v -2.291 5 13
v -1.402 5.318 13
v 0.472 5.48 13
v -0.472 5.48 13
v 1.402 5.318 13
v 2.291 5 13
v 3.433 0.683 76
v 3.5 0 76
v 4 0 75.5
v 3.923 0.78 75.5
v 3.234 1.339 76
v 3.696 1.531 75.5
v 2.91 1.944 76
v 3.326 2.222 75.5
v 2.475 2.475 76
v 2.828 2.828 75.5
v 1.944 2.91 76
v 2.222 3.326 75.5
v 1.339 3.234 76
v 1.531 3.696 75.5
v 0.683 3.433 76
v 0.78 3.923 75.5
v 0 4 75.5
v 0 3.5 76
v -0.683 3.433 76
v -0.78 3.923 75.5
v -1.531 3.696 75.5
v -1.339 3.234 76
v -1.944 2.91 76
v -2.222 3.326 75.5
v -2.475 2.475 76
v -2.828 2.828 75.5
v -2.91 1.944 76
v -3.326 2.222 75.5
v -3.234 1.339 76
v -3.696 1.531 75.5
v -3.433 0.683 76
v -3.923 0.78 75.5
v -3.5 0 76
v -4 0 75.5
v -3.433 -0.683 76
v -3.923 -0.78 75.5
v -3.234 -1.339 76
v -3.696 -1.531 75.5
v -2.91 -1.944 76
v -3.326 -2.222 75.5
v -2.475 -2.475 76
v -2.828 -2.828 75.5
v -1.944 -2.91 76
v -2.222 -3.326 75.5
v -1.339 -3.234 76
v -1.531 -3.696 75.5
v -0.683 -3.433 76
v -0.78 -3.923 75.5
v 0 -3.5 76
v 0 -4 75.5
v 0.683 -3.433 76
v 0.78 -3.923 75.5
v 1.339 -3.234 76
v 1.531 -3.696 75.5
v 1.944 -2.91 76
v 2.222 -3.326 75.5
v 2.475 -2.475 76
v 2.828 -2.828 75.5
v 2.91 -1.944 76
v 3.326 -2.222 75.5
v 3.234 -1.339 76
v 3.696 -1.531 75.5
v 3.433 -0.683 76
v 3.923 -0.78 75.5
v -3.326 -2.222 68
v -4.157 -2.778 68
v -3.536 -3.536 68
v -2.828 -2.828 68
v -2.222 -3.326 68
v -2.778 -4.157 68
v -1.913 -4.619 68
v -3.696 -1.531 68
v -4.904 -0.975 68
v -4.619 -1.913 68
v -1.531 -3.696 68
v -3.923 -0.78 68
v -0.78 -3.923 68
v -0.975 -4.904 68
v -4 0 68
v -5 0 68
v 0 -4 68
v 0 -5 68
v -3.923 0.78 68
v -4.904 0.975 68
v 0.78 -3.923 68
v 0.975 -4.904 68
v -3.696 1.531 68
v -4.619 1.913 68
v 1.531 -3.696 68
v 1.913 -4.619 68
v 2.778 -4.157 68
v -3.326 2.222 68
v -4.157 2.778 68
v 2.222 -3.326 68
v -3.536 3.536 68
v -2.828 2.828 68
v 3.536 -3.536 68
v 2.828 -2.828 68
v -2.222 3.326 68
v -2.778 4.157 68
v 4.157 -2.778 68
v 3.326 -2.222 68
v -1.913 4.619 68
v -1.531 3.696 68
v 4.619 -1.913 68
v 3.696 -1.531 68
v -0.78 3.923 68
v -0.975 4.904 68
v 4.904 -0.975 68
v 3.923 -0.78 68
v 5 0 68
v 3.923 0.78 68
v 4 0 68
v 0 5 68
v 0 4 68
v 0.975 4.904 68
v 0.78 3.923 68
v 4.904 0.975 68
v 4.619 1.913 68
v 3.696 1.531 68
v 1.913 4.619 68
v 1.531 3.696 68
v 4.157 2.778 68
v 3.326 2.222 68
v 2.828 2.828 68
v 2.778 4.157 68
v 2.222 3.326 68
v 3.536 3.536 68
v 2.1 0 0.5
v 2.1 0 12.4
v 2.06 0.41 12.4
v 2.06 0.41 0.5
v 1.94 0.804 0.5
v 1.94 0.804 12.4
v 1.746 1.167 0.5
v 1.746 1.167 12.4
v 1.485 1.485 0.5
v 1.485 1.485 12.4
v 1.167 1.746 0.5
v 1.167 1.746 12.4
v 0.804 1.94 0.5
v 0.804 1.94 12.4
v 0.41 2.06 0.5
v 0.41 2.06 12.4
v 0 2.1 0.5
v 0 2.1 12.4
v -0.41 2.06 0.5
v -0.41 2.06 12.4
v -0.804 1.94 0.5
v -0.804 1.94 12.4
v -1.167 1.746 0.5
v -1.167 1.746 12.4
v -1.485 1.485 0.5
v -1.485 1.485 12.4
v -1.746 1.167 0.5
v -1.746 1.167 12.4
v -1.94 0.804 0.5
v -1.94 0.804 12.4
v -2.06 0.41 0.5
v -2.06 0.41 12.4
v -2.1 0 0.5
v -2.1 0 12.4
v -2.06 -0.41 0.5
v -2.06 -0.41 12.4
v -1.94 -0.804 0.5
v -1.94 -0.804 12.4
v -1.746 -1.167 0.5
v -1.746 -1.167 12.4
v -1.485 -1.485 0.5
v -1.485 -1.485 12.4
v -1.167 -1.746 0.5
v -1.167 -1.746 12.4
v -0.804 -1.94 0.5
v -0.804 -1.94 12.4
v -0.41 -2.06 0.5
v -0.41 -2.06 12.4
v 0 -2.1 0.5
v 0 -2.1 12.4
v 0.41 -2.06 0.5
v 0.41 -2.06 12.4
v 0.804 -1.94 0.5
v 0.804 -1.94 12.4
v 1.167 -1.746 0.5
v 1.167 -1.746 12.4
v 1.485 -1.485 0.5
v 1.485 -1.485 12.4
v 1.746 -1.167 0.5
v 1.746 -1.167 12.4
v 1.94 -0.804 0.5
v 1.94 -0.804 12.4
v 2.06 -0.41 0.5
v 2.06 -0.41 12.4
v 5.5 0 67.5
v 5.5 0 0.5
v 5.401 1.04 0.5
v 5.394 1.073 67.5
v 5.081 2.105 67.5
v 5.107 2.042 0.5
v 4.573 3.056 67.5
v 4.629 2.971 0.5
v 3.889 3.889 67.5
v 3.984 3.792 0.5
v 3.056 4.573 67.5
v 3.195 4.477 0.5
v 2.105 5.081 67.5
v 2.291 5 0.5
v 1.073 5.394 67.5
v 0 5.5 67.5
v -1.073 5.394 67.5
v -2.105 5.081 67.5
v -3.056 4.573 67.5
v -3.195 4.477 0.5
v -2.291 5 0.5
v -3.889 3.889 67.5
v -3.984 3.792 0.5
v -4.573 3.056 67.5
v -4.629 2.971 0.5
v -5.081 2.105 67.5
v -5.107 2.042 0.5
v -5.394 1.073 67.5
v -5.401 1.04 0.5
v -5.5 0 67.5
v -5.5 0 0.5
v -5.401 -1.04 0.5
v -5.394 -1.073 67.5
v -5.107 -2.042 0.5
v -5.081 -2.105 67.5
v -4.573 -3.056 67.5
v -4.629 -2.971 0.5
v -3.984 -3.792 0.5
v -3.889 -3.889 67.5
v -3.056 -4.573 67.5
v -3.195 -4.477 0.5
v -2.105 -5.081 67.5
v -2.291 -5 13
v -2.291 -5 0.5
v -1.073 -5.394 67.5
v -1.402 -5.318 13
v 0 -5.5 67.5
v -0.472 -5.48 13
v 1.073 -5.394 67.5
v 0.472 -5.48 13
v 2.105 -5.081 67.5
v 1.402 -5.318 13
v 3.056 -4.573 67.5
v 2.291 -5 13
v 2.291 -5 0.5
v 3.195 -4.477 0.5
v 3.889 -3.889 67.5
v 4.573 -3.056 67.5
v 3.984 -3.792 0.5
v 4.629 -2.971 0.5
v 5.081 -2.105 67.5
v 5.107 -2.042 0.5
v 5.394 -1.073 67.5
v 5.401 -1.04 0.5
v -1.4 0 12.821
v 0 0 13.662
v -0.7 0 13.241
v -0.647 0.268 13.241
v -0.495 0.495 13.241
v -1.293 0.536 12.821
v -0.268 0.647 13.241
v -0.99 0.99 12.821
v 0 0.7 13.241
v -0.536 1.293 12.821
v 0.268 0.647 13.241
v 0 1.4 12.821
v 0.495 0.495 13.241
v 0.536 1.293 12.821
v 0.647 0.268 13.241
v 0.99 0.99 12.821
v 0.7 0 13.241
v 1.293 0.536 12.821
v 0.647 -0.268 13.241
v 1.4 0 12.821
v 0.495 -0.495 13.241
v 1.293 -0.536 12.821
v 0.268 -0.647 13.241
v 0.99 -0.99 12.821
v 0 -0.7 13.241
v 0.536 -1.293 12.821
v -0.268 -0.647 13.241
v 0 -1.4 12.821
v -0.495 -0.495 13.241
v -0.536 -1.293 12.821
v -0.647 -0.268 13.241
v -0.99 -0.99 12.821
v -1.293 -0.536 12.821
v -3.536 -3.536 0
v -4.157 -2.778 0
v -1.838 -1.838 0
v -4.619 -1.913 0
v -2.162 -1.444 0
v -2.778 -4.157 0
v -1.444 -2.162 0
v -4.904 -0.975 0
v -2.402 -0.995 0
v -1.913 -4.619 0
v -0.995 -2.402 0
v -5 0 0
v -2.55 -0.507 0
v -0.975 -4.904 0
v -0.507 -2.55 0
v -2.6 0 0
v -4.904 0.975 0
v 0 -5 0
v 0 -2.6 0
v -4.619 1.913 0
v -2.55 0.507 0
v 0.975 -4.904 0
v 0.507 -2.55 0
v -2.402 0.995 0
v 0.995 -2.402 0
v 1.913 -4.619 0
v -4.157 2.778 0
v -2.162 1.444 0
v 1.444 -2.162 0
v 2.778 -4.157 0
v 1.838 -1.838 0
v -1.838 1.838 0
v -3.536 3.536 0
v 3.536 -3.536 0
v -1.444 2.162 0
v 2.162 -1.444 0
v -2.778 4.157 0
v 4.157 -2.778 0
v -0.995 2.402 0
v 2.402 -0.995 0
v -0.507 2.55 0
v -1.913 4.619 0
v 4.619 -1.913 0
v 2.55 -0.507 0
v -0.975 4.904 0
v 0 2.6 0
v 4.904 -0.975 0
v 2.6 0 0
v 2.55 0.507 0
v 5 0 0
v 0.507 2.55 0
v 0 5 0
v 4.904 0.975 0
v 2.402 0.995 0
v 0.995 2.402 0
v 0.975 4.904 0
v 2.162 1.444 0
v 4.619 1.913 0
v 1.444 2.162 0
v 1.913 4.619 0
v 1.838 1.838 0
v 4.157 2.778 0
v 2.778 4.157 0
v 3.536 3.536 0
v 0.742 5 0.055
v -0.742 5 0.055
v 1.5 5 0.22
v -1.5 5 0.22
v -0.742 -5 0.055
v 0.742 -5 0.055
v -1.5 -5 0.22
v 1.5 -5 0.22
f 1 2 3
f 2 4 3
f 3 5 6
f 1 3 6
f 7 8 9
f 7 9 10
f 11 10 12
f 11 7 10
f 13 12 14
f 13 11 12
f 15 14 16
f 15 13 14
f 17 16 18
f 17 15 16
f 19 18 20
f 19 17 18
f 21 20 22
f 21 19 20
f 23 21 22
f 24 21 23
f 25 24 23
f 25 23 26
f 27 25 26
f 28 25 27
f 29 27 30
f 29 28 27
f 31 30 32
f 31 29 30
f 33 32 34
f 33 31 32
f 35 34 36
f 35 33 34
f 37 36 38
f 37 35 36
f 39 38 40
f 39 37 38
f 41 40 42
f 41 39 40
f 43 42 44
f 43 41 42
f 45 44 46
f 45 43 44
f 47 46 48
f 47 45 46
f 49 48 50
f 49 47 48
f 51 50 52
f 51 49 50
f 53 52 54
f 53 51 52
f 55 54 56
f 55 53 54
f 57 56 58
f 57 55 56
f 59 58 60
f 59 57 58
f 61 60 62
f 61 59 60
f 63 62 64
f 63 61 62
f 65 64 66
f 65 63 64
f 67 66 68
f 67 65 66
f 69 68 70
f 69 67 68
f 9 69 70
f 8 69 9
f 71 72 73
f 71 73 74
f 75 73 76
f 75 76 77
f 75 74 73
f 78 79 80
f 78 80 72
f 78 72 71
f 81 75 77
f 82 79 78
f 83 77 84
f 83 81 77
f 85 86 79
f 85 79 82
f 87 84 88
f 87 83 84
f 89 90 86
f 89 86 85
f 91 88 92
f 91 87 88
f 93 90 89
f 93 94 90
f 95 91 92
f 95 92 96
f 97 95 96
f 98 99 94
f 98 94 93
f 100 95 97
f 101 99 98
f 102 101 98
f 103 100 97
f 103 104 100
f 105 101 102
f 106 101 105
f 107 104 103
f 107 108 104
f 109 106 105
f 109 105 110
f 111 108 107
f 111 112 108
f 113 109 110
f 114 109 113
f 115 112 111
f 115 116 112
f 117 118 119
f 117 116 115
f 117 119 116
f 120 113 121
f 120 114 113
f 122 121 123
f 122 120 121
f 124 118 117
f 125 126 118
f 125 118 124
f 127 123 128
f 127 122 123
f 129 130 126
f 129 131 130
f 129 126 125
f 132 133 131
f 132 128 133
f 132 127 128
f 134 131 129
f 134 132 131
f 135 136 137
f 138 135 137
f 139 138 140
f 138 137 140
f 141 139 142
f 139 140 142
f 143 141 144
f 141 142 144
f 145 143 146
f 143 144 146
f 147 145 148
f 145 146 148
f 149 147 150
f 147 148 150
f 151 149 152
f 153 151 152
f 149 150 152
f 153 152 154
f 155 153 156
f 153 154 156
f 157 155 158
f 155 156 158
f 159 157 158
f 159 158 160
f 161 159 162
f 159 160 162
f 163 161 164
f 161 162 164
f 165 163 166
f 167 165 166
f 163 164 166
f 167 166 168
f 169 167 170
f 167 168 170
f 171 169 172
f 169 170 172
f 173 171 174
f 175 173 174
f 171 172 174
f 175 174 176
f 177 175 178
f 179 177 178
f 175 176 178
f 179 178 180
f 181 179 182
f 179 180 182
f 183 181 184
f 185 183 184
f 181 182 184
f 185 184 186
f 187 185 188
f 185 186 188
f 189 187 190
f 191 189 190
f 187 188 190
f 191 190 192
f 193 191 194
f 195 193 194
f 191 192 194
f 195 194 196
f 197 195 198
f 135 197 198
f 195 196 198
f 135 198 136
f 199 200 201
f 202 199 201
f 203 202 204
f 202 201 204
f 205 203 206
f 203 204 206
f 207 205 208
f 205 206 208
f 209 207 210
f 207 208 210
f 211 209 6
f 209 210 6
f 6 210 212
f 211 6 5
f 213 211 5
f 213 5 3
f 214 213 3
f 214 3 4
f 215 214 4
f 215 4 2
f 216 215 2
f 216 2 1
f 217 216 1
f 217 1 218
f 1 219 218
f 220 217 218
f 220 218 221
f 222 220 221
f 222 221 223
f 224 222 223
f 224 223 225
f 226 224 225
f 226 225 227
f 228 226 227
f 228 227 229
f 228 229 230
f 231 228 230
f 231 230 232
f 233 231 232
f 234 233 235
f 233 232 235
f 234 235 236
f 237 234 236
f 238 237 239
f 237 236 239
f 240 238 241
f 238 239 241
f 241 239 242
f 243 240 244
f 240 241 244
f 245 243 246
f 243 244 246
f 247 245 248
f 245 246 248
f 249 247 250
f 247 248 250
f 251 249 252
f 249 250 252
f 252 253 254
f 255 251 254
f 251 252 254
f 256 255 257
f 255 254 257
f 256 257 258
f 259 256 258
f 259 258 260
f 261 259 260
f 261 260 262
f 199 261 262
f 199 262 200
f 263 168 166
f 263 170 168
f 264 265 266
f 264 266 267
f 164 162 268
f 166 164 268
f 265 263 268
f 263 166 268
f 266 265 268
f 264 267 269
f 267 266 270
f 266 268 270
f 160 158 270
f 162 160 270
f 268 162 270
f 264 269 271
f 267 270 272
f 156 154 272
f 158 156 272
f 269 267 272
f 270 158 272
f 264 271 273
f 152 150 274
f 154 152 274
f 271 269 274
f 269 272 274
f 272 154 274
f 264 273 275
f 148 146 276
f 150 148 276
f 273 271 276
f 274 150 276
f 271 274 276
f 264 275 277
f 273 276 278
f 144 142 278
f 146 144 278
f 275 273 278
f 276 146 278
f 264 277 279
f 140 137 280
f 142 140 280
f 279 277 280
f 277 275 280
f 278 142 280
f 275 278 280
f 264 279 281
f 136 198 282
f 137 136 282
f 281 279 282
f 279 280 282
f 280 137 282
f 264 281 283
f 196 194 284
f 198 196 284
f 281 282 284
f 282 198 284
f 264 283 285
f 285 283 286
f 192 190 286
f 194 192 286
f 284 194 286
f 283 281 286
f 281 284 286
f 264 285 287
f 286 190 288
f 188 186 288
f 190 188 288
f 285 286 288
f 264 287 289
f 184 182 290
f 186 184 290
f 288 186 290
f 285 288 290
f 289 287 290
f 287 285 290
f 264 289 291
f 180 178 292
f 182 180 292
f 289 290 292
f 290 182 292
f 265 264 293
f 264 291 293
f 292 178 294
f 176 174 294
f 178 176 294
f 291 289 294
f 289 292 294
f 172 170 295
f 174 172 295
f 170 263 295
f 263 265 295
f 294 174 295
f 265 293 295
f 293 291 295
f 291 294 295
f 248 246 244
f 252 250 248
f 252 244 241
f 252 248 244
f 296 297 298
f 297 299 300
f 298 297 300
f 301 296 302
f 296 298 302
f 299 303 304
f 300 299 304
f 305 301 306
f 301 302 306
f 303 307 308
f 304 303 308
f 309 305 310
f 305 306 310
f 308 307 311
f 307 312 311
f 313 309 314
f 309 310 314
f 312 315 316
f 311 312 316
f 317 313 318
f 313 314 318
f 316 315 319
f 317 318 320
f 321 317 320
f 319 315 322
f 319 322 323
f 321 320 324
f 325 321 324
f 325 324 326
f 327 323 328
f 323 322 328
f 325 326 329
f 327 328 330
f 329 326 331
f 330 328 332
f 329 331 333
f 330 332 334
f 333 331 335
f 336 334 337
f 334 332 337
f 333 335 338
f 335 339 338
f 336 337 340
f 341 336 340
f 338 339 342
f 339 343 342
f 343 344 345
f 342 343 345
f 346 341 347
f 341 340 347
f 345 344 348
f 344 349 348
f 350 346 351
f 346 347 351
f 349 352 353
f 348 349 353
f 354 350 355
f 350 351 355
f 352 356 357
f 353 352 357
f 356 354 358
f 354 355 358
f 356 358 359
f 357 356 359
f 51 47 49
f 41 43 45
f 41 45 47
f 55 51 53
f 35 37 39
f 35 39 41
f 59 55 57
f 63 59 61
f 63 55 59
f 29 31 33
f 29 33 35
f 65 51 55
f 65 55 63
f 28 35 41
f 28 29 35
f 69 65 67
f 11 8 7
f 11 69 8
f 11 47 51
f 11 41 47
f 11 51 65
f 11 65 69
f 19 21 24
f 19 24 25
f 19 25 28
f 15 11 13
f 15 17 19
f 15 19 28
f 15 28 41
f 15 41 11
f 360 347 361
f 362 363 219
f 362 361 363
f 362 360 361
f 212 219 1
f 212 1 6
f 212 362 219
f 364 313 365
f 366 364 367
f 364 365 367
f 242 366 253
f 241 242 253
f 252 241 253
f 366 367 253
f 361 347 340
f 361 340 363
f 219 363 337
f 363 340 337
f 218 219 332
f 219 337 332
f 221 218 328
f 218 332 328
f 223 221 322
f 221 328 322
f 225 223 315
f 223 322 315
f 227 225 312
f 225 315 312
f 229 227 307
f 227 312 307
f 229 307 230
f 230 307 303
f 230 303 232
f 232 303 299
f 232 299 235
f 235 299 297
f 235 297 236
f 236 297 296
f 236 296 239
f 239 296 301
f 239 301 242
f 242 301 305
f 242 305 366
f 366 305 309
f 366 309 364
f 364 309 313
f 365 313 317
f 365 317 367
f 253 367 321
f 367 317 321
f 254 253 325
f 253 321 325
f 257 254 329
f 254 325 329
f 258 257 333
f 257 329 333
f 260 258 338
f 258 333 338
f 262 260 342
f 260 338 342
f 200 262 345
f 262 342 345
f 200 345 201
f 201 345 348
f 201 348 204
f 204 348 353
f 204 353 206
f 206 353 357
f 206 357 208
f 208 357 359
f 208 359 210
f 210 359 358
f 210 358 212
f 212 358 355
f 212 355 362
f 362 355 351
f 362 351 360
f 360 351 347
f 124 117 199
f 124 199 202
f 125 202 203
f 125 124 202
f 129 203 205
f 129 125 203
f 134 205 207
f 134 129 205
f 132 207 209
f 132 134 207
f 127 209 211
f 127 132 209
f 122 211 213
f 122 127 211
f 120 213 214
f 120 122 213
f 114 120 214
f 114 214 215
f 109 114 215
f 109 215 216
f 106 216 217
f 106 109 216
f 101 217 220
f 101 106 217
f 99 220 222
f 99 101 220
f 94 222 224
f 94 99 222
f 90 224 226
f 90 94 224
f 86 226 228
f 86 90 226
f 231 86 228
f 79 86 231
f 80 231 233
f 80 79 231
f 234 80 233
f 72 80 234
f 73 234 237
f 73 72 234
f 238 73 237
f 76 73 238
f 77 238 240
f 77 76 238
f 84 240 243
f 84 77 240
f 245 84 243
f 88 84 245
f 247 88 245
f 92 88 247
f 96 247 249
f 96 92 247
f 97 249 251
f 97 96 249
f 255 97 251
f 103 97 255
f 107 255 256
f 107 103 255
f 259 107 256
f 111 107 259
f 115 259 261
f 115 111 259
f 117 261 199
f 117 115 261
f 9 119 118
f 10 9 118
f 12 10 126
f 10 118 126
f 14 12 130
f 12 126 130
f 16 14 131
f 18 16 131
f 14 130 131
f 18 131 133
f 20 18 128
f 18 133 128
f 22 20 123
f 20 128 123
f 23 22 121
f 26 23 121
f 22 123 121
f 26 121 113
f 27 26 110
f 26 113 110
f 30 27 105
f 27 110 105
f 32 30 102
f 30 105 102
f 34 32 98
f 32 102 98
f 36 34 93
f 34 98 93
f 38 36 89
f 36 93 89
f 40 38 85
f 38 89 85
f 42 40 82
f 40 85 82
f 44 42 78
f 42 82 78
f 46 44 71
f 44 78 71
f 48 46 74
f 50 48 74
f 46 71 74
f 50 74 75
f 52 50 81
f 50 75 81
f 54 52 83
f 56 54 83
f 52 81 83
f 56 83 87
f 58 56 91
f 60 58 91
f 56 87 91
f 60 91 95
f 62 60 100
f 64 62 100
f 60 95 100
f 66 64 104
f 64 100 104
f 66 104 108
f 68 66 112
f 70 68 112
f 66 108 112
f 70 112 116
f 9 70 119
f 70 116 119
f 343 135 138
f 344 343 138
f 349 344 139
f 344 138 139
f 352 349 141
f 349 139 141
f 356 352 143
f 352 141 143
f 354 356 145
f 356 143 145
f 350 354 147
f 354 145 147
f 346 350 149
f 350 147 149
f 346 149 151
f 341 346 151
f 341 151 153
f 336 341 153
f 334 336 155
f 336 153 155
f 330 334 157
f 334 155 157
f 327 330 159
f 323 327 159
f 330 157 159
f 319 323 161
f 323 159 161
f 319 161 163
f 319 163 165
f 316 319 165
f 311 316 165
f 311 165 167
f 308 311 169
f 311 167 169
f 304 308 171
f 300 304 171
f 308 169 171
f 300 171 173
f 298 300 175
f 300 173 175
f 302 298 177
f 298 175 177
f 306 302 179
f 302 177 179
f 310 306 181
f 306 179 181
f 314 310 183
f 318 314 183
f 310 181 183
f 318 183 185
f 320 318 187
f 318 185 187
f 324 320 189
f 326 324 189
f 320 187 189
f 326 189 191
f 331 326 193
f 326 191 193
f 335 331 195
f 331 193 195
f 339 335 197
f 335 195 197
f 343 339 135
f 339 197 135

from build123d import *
from build123d.topology import SkipClean

# Parameters (mm, degrees)
SKETCH_1_R             = 5.5
EXTRUDE_1_DEPTH        = 68
CHAMFER_1_SIZE         = 0.5
SKETCH_2_R             = 4
EXTRUDE_2_DEPTH        = 8
CHAMFER_2_SIZE         = 0.5
HOLE_WIZARD_M5_1_D     = 4.2
HOLE_WIZARD_M5_1_DEPTH = 12.4
HOLE_WIZARD_M5_1_TIP   = 1.2618073
CHAMFER_3_SIZE         = 0.5
SKETCH_5_W             = 10
SKETCH_5_H             = 3
CUT_EXTRUDE_3_DEPTH    = 13


with BuildPart() as part:
    # 草图1 → 拉伸1 (new body)
    with BuildSketch(Plane.XY):
        Circle(SKETCH_1_R)
    extrude(amount=EXTRUDE_1_DEPTH)

    # 倒角1
    chamfer_1_edges = [part.edges().sort_by_distance(p)[0] for p in [
        (-5.5, 0, 0),
        (-5.5, 0, 68),
    ]]
    chamfer(chamfer_1_edges, length=CHAMFER_1_SIZE)

    # 草图2 → 拉伸2 (add)
    with BuildSketch(Plane.XY.offset(68)):
        Circle(SKETCH_2_R)
    extrude(amount=EXTRUDE_2_DEPTH)

    # 倒角2
    chamfer_2_edges = [part.edges().sort_by_distance(p)[0] for p in [
        (-4, 0, 76),
    ]]
    chamfer(chamfer_2_edges, length=CHAMFER_2_SIZE)

    # M5 螺纹孔1
    with Locations(Plane(origin=(0, 0, 0), x_dir=(-1, 0, 0), z_dir=(0, 0, -1))):
        with Locations((0, 0)):
            Hole(HOLE_WIZARD_M5_1_D / 2, depth=HOLE_WIZARD_M5_1_DEPTH)
            with Locations((0, 0, -(HOLE_WIZARD_M5_1_DEPTH + HOLE_WIZARD_M5_1_TIP / 2))):  # 118° drill point
                Cone(0, HOLE_WIZARD_M5_1_D / 2, HOLE_WIZARD_M5_1_TIP, mode=Mode.SUBTRACT)

    # 倒角3
    chamfer_3_edges = [part.edges().sort_by_distance(p)[0] for p in [
        (-2.1, 0, 0),
    ]]
    chamfer(chamfer_3_edges, length=CHAMFER_3_SIZE)

    # 草图5 → 拉伸3 (cut)
    with SkipClean():  # the faces are left unmerged after this step: merging them gives an invalid solid
        with BuildSketch(Plane.XY):
            with Locations((0, 6.5)):
                Rectangle(SKETCH_5_W, SKETCH_5_H)
        cut_extrude_3 = extrude(amount=CUT_EXTRUDE_3_DEPTH, mode=Mode.SUBTRACT)

    # 镜向1: 拉伸3 across plane
    add(cut_extrude_3.mirror(Plane.ZX), mode=Mode.SUBTRACT)


solid = part.part
